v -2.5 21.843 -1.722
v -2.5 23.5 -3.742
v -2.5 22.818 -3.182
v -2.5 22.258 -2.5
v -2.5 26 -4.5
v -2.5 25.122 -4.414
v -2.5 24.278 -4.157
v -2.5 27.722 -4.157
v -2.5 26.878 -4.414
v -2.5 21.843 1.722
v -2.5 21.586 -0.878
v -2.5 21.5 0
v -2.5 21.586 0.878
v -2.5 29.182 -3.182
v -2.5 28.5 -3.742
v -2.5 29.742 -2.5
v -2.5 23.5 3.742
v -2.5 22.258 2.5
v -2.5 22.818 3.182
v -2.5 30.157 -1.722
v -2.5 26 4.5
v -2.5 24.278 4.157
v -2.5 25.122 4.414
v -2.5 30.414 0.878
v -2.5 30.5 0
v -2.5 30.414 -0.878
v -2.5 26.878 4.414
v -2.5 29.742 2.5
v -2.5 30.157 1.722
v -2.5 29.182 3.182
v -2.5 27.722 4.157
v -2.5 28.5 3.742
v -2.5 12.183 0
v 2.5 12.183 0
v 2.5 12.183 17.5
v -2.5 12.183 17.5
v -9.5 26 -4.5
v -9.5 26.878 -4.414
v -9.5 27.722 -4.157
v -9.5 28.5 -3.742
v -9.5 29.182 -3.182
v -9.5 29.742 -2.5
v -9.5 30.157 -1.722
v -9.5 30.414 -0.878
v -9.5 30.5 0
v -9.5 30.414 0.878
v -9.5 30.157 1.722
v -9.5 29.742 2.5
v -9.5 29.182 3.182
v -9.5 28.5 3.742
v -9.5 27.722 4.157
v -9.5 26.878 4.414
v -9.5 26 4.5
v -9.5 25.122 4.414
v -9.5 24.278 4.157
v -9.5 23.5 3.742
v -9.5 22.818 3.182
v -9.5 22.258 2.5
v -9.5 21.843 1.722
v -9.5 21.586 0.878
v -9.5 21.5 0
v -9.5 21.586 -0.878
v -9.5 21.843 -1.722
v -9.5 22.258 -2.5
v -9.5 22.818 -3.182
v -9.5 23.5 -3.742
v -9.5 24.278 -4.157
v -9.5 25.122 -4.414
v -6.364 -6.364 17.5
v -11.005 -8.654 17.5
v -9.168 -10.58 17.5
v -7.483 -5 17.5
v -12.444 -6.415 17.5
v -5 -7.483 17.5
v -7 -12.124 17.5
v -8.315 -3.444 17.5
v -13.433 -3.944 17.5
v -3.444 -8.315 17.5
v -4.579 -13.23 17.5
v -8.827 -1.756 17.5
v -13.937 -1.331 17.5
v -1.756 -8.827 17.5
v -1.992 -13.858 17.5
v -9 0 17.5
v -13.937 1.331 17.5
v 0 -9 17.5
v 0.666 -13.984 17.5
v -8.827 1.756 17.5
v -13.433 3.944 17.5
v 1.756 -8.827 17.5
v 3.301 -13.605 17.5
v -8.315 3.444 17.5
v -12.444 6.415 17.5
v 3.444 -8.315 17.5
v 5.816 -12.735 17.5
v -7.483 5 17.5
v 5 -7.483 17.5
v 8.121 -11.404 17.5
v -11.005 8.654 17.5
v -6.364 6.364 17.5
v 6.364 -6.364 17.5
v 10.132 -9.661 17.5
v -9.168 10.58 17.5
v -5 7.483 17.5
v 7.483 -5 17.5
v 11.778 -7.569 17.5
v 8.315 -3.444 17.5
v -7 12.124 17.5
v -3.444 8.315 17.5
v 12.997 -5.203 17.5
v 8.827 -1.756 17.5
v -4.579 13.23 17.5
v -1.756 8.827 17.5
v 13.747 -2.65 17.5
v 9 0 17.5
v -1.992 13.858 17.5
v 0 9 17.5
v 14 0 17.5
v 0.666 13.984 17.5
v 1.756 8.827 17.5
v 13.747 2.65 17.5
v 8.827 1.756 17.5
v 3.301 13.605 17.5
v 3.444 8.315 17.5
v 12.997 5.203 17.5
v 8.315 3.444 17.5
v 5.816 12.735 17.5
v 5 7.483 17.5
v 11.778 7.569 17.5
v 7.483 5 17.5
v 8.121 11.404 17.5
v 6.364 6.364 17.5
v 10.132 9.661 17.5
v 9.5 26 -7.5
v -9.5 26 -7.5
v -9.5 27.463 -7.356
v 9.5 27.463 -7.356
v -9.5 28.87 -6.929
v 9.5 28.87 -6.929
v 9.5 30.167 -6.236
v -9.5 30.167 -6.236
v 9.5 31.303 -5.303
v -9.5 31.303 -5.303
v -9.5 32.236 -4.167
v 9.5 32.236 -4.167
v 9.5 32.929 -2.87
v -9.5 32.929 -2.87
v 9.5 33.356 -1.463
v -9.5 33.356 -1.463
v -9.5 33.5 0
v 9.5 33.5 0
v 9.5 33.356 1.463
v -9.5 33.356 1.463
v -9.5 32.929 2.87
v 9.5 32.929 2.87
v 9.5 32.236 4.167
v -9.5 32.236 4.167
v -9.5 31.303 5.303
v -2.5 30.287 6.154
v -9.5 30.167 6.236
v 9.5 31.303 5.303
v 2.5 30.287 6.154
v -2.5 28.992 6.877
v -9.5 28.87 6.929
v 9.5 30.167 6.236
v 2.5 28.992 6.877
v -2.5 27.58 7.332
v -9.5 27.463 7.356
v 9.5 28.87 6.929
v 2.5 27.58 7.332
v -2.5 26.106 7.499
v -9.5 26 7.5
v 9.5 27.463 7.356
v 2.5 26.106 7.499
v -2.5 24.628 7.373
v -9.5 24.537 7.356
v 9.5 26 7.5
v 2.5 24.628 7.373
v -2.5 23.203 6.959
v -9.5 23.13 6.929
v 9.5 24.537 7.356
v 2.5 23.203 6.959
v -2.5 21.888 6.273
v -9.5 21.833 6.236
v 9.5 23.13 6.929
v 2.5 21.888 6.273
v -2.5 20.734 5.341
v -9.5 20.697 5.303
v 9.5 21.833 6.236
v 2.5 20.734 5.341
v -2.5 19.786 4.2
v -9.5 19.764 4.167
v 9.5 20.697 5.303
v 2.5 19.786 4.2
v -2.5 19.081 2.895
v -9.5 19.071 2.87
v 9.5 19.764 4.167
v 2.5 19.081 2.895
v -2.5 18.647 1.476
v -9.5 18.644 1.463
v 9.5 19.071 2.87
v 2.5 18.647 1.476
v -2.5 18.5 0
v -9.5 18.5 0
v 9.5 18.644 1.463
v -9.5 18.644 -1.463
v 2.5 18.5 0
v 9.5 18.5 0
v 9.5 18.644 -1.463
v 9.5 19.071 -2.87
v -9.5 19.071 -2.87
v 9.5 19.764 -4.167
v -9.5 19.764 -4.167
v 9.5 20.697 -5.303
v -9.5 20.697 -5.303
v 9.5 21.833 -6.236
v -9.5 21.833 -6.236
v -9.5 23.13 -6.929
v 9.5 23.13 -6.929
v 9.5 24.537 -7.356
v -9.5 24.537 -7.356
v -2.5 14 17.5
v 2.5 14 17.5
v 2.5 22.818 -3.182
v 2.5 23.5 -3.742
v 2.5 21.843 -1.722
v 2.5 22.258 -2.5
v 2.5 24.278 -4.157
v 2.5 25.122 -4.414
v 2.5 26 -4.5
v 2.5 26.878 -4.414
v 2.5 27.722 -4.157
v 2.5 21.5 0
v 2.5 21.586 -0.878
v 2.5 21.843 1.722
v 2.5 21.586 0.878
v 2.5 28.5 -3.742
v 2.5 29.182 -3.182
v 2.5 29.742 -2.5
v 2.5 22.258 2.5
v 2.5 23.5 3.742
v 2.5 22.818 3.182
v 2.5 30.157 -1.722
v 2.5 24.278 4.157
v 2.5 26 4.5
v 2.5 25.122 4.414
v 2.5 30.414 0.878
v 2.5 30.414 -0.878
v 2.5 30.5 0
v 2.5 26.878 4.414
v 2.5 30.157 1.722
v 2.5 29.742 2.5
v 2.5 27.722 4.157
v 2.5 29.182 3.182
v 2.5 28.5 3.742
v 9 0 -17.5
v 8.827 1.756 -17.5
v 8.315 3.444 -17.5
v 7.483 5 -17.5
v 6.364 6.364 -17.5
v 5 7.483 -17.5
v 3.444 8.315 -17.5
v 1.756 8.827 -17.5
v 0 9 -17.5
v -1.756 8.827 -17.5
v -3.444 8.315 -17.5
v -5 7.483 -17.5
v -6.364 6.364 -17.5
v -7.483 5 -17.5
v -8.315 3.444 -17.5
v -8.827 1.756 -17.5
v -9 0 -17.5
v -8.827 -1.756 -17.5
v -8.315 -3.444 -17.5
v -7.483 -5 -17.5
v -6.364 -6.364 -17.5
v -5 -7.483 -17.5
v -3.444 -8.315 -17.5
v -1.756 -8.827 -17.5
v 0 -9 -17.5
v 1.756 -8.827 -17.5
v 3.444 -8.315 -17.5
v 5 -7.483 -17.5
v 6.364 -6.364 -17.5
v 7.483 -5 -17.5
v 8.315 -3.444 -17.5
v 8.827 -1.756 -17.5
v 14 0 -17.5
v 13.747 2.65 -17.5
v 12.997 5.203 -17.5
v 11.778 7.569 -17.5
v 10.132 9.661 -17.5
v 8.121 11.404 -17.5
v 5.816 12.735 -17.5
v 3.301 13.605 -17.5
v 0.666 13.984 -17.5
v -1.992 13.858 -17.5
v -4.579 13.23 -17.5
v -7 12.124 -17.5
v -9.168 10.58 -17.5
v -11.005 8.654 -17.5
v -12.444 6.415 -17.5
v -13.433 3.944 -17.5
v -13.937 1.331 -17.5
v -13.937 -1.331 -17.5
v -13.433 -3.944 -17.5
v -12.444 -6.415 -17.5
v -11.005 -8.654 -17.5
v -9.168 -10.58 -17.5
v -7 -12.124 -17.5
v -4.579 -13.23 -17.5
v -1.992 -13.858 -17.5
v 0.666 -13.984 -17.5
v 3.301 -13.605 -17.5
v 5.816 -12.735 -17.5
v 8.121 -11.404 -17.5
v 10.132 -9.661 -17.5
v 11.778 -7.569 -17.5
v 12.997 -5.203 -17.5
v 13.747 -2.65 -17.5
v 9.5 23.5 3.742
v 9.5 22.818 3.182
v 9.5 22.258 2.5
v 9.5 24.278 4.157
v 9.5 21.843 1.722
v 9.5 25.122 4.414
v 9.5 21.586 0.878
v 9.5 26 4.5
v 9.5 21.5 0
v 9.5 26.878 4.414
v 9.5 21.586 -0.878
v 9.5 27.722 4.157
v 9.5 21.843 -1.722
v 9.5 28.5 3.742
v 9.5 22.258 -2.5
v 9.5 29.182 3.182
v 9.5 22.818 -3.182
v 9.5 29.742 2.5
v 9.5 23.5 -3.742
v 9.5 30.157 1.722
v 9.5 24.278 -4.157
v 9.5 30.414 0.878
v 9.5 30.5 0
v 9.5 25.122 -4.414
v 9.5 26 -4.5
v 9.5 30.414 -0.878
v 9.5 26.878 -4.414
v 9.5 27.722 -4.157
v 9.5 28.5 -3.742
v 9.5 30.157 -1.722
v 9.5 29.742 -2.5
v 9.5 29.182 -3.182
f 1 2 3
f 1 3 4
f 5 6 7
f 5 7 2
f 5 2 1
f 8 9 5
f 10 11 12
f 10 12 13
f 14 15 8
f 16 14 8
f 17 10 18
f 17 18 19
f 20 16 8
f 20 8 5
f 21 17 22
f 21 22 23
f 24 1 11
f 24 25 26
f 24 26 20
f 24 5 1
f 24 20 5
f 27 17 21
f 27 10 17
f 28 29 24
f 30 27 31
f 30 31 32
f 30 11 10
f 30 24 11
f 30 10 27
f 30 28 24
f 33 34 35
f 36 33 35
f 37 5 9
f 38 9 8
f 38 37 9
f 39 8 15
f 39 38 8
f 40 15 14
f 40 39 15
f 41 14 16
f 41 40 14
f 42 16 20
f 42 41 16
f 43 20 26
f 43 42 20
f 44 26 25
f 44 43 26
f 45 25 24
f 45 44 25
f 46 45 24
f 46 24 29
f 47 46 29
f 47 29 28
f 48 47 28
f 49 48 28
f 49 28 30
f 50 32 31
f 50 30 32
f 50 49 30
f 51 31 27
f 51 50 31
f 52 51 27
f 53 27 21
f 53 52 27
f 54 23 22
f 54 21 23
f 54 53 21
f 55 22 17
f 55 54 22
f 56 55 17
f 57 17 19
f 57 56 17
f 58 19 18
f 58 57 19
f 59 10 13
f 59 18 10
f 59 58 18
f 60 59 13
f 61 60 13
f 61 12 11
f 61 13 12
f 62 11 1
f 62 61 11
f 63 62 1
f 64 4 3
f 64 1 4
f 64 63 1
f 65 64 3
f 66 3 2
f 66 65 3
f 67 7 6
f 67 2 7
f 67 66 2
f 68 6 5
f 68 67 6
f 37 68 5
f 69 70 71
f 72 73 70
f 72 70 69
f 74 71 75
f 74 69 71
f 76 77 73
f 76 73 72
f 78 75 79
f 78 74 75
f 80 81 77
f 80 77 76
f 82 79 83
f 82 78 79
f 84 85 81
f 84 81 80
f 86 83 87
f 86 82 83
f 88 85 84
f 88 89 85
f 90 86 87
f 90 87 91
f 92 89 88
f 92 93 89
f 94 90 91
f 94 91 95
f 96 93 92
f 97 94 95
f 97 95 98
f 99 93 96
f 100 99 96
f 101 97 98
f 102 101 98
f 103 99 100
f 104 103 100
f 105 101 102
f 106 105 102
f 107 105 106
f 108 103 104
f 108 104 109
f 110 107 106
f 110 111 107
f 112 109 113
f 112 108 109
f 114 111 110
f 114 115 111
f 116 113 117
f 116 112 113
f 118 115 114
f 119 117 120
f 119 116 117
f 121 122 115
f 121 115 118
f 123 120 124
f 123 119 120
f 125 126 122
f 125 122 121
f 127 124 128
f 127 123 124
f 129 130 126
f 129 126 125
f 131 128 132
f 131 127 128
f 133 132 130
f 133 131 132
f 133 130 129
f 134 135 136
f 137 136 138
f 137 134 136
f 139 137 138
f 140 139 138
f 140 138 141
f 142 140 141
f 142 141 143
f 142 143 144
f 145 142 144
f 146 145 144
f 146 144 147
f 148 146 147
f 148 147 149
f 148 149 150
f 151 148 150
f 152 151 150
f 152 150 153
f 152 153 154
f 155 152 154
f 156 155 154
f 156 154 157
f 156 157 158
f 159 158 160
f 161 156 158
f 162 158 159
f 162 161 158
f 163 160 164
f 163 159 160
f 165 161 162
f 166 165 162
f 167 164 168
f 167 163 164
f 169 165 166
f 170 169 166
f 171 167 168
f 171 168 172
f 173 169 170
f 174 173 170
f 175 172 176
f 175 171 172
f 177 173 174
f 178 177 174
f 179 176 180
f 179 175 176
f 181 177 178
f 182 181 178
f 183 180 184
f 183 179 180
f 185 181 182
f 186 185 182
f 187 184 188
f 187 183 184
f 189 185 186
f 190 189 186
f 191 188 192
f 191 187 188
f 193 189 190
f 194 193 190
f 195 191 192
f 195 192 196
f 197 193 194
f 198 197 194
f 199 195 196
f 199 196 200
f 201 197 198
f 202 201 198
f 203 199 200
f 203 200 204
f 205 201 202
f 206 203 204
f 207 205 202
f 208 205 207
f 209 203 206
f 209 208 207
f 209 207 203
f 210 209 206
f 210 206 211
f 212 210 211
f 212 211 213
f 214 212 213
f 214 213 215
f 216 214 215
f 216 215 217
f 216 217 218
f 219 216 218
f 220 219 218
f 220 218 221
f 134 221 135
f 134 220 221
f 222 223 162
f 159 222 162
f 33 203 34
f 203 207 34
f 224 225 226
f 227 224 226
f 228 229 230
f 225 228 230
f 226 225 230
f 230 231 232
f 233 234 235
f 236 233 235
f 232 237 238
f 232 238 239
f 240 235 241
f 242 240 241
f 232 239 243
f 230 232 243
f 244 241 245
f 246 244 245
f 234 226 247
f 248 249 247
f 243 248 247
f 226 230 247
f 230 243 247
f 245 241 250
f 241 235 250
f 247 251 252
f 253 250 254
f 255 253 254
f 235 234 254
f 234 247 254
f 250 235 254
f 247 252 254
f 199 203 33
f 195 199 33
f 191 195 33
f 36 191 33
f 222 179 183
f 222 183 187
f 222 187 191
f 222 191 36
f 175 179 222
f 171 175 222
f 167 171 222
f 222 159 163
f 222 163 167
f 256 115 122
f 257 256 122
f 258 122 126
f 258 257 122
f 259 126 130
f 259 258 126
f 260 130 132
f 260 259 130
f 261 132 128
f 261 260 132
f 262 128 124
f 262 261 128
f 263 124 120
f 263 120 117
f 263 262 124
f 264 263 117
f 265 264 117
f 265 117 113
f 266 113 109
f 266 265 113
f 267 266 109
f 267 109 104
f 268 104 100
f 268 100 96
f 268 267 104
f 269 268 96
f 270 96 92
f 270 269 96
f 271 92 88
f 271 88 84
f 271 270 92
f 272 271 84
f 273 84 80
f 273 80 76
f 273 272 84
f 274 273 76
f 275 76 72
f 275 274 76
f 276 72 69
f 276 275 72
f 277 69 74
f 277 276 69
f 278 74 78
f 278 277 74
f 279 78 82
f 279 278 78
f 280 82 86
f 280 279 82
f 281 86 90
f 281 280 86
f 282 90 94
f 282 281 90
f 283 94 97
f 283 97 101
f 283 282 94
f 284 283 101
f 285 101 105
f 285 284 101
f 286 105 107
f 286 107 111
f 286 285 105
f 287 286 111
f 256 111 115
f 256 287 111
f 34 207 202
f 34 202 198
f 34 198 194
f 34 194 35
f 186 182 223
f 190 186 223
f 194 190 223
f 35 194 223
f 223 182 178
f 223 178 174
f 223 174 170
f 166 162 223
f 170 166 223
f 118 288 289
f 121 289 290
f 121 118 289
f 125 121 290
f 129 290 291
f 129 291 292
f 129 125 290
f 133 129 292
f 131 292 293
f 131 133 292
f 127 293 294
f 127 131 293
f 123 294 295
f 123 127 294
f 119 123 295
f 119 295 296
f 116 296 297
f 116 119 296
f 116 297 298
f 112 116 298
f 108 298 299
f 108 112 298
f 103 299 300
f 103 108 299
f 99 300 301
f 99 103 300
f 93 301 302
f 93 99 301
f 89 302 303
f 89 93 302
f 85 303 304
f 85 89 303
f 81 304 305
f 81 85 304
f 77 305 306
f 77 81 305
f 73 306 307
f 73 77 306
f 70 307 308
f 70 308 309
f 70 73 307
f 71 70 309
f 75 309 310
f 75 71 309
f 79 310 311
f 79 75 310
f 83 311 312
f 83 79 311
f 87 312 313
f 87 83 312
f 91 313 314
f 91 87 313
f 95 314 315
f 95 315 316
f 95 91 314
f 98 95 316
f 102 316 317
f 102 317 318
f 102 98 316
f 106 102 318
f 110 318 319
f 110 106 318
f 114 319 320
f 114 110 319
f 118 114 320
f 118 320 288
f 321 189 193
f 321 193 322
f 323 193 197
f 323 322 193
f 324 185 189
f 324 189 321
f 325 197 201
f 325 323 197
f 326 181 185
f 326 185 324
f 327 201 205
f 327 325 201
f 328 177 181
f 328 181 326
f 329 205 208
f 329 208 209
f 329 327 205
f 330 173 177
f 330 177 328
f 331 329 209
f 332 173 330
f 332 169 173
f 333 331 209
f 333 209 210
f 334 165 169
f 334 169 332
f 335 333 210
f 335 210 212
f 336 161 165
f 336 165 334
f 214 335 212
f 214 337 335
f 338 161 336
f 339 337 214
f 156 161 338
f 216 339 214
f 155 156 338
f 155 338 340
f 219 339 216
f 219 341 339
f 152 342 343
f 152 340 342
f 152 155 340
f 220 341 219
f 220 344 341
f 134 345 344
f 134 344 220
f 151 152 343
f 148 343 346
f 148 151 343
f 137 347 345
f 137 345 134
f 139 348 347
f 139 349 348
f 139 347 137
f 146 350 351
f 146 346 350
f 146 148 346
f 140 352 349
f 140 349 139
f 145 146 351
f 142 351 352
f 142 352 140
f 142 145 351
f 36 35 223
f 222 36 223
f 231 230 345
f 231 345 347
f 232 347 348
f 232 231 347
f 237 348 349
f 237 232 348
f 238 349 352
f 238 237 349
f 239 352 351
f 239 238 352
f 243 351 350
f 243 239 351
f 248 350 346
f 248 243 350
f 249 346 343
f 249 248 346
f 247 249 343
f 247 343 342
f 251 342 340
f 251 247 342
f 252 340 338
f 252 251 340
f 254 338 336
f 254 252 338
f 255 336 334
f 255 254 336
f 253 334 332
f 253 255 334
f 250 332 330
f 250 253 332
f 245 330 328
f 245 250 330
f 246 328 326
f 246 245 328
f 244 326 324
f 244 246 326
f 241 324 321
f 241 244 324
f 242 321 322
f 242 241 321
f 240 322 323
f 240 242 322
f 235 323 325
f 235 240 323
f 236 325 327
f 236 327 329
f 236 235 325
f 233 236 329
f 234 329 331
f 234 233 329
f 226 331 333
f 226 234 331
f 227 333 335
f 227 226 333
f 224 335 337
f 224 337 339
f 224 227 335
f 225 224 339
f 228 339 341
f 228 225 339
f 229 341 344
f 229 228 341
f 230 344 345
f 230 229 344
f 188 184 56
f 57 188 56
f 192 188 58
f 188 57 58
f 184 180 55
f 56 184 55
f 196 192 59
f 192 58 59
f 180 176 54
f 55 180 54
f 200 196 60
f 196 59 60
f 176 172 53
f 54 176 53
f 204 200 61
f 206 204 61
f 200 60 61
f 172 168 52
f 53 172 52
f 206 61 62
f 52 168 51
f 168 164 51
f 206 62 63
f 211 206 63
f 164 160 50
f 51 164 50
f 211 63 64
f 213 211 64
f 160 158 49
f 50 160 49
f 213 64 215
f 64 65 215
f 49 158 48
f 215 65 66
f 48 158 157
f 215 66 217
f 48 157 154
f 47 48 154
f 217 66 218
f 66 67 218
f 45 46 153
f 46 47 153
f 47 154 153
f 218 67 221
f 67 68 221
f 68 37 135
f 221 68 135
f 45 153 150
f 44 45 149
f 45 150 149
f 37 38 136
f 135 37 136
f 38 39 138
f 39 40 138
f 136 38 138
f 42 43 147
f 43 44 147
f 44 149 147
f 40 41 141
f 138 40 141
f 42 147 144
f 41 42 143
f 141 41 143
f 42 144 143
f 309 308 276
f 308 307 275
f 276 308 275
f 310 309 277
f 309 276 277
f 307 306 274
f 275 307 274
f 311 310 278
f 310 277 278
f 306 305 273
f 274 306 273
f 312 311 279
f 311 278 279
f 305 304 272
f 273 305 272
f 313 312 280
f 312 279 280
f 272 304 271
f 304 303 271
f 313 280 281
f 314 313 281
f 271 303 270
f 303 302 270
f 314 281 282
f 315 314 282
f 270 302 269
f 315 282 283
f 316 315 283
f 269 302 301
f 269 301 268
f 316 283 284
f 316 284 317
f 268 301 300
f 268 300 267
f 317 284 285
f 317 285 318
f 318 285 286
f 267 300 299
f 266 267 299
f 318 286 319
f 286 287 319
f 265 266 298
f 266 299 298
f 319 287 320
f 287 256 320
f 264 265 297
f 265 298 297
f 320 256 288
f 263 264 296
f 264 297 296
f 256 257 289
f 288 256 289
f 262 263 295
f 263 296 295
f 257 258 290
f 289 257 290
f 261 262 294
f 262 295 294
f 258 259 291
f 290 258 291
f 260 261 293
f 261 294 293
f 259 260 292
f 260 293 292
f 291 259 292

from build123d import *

# Parameters (mm, degrees)
SKETCH1_R           = 14
SKETCH1_R_2         = 9
EXTRUDE_THIN1_DEPTH = 17.5
SKETCH2_R           = 7.5
SKETCH2_R_2         = 4.5
EXTRUDE_THIN2_DEPTH = 9.5
BOSS_EXTRUDE1_DEPTH = 2.5


with BuildPart() as part:
    # Sketch1 → Extrude-Thin1 (new, symmetric)
    with BuildSketch(Plane.XY):
        Circle(SKETCH1_R)
        Circle(SKETCH1_R_2, mode=Mode.SUBTRACT)
    extrude(amount=EXTRUDE_THIN1_DEPTH, both=True)


with BuildPart() as body_2:
    # Sketch2 → Extrude-Thin2 (new, symmetric)
    with BuildSketch(Plane(origin=(0, 0, 0), x_dir=(0, 0, -1), z_dir=(1, 0, 0))):
        with Locations((0, 26)):
            Circle(SKETCH2_R)
        with Locations((0, 26)):
            Circle(SKETCH2_R_2, mode=Mode.SUBTRACT)
    extrude(amount=EXTRUDE_THIN2_DEPTH, both=True)

    # Sketch3 → Boss-Extrude1 (add, symmetric)
    with BuildSketch(Plane(origin=(0, 0, 0), x_dir=(0, 0, -1), z_dir=(1, 0, 0))):
        with BuildLine():
            Line((-17.5, 14), (-6.153967777, 30.287036342))
            ThreePointArc((-6.153967777, 30.287036342), (6.648412313, 29.471111309), (0, 18.5))
            Line((0, 18.5), (0, 14))
            Line((0, 14), (0, 12.183223564))
            Line((0, 12.183223564), (-17.5, 12.183223564))
            Line((-17.5, 12.183223564), (-17.5, 14))
        make_face()
    extrude(amount=BOSS_EXTRUDE1_DEPTH, both=True)


solid = Compound([part.part, body_2.part])
